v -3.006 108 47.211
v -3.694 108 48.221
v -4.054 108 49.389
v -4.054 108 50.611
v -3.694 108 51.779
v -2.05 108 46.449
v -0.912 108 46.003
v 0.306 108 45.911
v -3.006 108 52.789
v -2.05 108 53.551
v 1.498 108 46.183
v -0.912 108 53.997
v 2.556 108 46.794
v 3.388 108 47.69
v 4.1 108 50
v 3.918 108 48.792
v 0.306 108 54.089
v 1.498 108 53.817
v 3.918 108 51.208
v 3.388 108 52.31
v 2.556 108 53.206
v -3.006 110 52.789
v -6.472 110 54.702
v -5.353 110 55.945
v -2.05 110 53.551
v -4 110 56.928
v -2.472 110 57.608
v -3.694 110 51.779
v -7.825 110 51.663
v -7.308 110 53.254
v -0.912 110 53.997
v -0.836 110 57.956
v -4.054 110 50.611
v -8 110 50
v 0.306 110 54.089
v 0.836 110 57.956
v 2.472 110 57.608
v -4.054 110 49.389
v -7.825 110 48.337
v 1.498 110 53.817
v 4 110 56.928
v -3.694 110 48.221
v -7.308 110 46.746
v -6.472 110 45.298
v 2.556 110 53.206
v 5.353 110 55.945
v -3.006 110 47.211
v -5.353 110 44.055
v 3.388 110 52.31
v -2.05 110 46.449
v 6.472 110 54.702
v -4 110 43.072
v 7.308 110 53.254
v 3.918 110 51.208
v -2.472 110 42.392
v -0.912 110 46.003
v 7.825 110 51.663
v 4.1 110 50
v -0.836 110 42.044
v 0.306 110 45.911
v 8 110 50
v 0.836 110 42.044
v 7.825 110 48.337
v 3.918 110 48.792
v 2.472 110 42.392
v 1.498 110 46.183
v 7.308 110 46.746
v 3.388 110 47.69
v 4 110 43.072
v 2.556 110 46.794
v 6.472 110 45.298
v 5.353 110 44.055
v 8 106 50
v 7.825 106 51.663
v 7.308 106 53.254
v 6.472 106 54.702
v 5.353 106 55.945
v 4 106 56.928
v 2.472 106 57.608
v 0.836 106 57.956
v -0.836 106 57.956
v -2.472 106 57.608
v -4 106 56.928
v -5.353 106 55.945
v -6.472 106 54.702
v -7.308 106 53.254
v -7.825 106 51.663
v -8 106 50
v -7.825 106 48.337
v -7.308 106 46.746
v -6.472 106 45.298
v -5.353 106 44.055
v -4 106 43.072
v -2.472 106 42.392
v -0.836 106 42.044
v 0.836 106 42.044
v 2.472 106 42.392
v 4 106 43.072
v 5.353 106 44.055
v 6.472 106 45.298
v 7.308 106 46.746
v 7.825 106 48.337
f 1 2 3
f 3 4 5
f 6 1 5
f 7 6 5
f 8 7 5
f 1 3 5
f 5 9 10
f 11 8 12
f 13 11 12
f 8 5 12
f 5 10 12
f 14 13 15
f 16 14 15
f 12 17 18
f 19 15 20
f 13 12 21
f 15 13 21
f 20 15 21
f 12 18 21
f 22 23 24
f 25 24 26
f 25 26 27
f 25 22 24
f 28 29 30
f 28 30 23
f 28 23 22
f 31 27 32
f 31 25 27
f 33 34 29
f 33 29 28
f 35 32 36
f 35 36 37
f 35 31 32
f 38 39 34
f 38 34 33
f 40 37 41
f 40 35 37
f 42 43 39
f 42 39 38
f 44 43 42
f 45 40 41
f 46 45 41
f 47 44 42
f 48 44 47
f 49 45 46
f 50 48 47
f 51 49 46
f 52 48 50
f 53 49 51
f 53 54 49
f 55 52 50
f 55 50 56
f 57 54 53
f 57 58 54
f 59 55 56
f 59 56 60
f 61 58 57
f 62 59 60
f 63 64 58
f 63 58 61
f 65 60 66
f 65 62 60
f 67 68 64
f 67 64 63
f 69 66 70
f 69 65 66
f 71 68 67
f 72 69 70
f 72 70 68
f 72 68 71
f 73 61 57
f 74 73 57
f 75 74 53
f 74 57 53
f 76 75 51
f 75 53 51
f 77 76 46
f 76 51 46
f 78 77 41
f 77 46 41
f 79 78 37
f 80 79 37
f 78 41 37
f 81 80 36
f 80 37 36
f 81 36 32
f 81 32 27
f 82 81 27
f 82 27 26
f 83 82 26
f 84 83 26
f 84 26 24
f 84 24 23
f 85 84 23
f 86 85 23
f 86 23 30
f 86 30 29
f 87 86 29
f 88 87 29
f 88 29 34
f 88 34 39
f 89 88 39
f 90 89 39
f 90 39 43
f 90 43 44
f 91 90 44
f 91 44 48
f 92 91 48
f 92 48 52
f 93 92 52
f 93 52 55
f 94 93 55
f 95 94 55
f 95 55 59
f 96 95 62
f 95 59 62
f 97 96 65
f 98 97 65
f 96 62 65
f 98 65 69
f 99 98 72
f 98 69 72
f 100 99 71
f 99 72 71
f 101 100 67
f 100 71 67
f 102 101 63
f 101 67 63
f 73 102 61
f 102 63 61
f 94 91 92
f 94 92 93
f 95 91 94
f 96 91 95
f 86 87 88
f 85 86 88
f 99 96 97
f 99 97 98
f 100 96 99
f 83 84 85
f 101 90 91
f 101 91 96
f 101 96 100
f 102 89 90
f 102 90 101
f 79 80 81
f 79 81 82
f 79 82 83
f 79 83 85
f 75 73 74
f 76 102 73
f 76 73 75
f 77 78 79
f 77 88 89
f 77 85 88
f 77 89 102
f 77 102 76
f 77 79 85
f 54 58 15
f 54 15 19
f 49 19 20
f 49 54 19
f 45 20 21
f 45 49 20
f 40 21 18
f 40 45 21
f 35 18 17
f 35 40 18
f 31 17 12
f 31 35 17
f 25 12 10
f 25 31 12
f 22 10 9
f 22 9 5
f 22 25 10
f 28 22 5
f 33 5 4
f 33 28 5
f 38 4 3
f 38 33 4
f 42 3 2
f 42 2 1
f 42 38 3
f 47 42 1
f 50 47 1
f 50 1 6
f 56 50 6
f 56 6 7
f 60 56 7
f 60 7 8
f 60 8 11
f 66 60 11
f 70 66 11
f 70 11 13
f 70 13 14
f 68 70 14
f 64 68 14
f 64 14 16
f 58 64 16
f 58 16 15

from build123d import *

# Parameters (mm, degrees)
BOX252_W          = 40
BOX252_H          = 20
BOX252_DEPTH      = 40
CYLINDER650_R     = 4.1
CYLINDER650_DEPTH = 10
CYLINDER649_R     = 8
CYLINDER649_DEPTH = 8


with BuildPart() as krychle252:
    # Box252 → Box252 (new body)
    with BuildSketch(Plane(origin=(-20, 110, 30), x_dir=(1, 0, 0), z_dir=(0, 0, 1))):
        with Locations((20, 10)):
            Rectangle(BOX252_W, BOX252_H)
    extrude(amount=BOX252_DEPTH)


with BuildPart() as v_lec650:
    # Cylinder650 → Cylinder650 (new body)
    with BuildSketch(Plane(origin=(0, 118, 50), x_dir=(1, 0, 0), z_dir=(0, -1, 0))):
        Circle(CYLINDER650_R)
    extrude(amount=CYLINDER650_DEPTH)


with BuildPart() as cut260:
    # Cylinder649 → Cylinder649 (new body)
    with BuildSketch(Plane(origin=(0, 114, 50), x_dir=(1, 0, 0), z_dir=(0, -1, 0))):
        Circle(CYLINDER649_R)
    extrude(amount=CYLINDER649_DEPTH)

    # Cut255: cut Válec650
    add(v_lec650.part, mode=Mode.SUBTRACT)

    # Cut260: cut Krychle252
    add(krychle252.part, mode=Mode.SUBTRACT)


solid = cut260.part
